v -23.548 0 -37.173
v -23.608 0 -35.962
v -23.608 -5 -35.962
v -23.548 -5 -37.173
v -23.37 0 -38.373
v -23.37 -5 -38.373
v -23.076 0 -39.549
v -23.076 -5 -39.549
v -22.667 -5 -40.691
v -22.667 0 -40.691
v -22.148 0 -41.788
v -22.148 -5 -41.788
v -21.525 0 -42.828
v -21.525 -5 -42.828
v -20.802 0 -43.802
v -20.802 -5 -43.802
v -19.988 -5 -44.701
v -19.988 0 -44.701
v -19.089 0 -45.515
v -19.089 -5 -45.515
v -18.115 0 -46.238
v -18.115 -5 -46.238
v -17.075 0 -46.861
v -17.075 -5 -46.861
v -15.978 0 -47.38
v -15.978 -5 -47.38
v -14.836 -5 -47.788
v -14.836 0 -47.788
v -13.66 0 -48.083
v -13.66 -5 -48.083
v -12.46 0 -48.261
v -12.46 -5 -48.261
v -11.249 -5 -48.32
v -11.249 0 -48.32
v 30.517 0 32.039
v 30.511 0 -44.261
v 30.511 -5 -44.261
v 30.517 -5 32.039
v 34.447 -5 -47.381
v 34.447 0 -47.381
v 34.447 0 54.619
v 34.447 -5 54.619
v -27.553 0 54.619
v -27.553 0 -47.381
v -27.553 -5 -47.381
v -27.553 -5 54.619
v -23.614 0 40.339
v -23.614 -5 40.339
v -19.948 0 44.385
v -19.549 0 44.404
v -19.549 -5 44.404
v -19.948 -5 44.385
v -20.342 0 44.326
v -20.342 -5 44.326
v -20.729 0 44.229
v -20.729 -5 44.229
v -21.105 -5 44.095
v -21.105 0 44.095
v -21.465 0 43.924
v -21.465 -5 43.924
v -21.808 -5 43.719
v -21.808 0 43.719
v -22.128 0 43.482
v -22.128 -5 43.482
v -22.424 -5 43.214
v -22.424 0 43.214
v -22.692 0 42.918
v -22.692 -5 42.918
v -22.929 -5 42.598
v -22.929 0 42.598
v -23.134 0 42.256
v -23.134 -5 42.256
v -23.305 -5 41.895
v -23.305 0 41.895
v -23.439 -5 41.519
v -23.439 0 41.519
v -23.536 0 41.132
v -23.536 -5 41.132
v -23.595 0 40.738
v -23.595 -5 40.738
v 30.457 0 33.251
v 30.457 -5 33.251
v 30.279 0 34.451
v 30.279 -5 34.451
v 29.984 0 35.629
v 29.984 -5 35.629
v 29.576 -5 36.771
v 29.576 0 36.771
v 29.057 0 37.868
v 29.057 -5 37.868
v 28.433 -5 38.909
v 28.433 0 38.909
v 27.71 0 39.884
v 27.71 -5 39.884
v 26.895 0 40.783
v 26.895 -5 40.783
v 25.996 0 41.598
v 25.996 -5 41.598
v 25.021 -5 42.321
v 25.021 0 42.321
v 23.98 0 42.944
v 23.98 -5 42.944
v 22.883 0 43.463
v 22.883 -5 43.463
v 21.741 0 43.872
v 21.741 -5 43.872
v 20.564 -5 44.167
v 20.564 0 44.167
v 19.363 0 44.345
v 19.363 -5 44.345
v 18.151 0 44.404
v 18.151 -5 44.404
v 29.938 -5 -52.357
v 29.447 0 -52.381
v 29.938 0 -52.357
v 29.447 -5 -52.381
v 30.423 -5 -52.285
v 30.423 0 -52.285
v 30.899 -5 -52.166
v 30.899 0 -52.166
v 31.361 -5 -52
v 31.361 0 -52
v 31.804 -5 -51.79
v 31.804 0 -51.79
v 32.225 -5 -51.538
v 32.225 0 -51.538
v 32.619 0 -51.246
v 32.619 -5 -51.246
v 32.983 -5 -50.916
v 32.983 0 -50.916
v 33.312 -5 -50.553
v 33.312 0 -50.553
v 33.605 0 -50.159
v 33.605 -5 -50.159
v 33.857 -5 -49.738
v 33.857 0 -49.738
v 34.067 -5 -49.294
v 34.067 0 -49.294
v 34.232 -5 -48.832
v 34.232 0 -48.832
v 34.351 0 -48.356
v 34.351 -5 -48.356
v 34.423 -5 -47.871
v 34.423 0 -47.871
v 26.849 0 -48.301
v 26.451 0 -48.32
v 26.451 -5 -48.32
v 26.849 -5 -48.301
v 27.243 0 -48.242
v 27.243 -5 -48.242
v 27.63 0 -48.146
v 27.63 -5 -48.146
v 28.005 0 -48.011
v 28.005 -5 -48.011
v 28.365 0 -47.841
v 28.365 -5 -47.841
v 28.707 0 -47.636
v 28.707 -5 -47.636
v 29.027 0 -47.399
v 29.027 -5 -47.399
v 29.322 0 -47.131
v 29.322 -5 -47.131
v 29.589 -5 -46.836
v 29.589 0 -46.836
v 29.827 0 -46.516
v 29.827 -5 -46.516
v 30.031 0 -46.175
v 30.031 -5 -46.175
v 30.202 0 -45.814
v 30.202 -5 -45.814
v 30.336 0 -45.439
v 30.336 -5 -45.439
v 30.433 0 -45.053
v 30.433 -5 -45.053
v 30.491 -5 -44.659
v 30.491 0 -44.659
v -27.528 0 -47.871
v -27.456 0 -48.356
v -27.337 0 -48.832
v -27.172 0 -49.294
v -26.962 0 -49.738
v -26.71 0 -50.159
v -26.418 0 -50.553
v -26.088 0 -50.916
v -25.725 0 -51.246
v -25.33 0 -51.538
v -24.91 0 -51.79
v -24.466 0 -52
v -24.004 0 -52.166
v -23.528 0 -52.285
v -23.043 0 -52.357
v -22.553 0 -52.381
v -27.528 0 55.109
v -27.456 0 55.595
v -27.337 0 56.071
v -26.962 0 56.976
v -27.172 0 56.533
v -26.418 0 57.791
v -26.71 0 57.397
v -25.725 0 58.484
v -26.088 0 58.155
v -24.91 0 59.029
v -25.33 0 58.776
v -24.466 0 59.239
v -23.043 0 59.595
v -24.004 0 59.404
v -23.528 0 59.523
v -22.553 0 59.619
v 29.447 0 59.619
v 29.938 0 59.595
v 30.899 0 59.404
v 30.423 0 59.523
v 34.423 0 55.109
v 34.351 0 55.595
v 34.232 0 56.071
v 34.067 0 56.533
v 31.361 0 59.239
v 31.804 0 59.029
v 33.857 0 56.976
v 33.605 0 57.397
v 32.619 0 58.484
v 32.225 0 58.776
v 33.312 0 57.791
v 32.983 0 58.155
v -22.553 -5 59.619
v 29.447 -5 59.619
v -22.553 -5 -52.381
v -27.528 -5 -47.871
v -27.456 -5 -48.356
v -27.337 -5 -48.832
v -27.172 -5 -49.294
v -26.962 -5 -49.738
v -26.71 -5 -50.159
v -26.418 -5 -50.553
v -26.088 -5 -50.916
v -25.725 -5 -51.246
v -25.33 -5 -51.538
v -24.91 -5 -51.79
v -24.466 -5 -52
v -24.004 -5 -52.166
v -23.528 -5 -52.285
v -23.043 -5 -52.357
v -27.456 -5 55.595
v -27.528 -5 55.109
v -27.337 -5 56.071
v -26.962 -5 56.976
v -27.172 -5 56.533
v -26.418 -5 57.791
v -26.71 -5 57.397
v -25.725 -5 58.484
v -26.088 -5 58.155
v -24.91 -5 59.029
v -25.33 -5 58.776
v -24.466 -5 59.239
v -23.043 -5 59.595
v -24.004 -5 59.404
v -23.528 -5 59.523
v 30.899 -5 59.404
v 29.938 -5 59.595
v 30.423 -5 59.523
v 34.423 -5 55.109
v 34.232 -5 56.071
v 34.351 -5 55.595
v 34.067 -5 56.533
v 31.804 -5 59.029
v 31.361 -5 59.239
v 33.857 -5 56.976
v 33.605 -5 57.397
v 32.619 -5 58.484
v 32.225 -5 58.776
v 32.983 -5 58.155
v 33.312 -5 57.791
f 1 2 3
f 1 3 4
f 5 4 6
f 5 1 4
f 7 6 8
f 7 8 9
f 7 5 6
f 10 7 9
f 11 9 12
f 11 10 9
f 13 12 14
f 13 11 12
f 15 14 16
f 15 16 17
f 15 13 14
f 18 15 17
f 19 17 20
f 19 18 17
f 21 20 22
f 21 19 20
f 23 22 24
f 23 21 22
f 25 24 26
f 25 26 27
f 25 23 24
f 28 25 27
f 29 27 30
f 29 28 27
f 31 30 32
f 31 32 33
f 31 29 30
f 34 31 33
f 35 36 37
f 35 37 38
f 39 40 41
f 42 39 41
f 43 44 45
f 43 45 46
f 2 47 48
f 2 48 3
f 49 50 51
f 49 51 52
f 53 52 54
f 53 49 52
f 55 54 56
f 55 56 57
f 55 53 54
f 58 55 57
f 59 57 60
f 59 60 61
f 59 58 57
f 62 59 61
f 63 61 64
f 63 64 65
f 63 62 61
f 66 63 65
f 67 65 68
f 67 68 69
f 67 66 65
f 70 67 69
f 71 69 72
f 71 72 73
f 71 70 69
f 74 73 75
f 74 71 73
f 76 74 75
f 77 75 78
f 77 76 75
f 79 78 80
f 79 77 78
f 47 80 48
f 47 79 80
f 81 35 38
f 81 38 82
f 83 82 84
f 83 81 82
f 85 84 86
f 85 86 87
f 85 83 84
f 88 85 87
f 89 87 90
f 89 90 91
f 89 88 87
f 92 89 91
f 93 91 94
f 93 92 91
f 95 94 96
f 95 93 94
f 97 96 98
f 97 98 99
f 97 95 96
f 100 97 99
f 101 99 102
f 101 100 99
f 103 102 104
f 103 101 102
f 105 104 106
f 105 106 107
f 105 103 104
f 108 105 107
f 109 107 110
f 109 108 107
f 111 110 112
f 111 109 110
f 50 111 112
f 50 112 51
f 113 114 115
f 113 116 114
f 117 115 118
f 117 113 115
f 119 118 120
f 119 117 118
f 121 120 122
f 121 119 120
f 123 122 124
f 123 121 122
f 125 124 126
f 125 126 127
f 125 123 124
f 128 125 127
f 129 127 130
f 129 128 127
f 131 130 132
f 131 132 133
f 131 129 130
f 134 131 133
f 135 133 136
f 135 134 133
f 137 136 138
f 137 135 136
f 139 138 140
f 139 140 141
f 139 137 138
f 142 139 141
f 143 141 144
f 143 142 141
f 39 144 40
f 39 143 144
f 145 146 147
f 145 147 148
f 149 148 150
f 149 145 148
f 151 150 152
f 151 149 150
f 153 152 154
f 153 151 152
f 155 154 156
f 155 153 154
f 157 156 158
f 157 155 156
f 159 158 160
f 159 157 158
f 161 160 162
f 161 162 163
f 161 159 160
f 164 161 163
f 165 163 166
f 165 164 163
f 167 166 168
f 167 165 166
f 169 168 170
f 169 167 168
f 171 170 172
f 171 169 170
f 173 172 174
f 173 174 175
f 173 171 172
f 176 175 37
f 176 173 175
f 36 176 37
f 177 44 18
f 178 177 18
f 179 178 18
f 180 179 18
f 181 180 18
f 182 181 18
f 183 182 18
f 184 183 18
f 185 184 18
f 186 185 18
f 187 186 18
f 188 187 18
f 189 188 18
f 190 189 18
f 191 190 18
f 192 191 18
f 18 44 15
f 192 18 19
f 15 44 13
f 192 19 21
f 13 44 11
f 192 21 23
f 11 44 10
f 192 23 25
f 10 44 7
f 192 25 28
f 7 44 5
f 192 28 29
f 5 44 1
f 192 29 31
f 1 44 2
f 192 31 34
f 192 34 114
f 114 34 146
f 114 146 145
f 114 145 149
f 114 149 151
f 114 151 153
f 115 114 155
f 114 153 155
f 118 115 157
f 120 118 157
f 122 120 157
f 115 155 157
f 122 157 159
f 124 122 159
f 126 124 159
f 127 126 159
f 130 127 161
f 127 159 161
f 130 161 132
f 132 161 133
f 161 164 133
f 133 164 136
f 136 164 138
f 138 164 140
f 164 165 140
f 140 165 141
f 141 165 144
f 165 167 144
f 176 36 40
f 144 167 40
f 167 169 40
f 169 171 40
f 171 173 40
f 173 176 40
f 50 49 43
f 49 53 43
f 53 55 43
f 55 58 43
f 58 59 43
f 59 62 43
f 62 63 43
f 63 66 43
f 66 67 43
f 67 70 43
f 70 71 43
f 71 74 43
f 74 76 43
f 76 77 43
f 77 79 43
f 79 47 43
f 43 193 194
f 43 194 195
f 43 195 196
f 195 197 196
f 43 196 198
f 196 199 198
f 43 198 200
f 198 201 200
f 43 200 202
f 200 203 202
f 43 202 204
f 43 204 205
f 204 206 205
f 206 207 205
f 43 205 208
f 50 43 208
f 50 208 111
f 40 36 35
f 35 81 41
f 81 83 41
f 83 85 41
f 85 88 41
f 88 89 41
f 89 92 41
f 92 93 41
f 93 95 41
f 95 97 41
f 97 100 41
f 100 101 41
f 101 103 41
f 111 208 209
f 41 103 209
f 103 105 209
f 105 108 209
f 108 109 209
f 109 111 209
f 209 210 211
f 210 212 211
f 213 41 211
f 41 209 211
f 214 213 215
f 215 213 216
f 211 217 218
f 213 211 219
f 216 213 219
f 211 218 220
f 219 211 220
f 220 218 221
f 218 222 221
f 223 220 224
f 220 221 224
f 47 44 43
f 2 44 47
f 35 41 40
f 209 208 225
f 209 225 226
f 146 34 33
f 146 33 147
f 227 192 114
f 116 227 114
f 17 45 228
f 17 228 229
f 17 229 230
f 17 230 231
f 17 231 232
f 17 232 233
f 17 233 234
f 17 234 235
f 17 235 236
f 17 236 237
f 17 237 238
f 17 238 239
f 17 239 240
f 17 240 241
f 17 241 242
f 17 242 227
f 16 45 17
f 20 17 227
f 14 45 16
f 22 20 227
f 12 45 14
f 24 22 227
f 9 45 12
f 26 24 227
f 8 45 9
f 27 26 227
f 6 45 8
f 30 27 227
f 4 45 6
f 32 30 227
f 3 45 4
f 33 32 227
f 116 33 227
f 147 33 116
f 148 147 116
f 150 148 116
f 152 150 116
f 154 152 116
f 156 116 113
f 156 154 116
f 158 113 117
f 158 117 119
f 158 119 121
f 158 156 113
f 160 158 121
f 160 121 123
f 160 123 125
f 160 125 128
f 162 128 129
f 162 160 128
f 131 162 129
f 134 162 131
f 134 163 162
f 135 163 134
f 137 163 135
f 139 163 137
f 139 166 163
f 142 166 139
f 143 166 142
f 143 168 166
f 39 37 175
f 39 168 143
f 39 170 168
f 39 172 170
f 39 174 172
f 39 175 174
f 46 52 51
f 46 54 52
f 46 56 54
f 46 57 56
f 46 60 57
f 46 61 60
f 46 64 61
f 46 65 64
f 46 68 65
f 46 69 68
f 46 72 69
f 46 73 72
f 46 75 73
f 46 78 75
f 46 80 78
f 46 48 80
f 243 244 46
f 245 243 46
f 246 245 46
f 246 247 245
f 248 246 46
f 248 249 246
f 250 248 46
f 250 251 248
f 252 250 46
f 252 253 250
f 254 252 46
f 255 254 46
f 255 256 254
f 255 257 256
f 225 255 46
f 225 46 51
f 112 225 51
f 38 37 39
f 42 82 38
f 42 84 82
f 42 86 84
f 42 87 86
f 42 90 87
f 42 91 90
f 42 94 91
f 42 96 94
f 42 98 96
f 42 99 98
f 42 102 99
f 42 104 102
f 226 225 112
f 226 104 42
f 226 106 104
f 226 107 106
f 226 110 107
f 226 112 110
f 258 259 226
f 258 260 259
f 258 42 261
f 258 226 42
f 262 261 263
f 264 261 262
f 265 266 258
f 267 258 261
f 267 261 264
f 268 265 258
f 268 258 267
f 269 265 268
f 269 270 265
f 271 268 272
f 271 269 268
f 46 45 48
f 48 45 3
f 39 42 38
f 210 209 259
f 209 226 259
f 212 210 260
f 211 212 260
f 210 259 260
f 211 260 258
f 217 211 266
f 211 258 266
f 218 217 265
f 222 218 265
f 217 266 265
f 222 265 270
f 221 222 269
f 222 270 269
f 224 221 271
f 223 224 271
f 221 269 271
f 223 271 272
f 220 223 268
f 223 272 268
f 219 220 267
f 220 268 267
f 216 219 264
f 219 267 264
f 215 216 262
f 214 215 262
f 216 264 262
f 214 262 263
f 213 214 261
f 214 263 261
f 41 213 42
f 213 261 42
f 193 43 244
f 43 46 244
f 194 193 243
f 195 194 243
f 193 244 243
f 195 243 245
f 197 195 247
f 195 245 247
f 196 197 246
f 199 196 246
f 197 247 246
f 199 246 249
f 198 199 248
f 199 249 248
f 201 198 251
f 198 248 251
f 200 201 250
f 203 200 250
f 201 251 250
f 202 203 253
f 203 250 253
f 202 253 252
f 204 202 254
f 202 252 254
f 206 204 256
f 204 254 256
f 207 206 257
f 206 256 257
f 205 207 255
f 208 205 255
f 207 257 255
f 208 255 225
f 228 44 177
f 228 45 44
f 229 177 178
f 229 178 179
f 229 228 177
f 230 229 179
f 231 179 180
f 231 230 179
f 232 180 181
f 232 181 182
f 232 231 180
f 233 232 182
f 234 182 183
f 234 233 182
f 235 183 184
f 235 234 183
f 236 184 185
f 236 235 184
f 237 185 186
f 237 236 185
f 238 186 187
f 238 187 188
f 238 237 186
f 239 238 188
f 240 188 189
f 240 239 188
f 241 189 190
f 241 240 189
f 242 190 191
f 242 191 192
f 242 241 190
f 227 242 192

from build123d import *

# Parameters (mm, degrees)
F1_W     = 62
F1_H     = 112
F2_DEPTH = 5
F4_DEPTH = 5
F5_R     = 5


with BuildPart() as f2:
    # F1 (on Front) → F2 (new body)
    with BuildSketch(Plane.XZ):
        with Locations((3.447434, 3.619151)):
            Rectangle(F1_W, F1_H)
    extrude(amount=F2_DEPTH)

    # F3 (on Front) → F4 (cut)
    with BuildSketch(Plane.XZ):
        with BuildLine():
            ThreePointArc((30.516835, 32.039018), (26.895076, 40.782716), (18.151378, 44.404474))
            Line((18.151378, 44.404474), (-19.549268, 44.404474))
            ThreePointArc((-19.549268, 44.404474), (-22.423638, 43.213804), (-23.614078, 40.339338))
            Line((-23.614078, 40.339338), (-23.607969, -35.961972))
            ThreePointArc((-23.607969, -35.961972), (-19.98765, -44.70071), (-11.248622, -48.320329))
            Line((-11.248622, -48.320329), (26.451378, -48.320329))
            ThreePointArc((26.451378, -48.320329), (29.32177, -47.131374), (30.510725, -44.260982))
            Line((30.510725, -44.260982), (30.516835, 32.039018))
        make_face()
    extrude(amount=F4_DEPTH, mode=Mode.SUBTRACT)

    # F5
    f5_edges = [f2.edges().sort_by_distance(p)[0] for p in [
        (-27.552566, -2.5, 59.619151),
        (-27.552566, -2.5, -52.380849),
        (34.447434, -2.5, -52.380849),
        (34.447434, -2.5, 59.619151),
    ]]
    fillet(f5_edges, radius=F5_R)


solid = f2.part
